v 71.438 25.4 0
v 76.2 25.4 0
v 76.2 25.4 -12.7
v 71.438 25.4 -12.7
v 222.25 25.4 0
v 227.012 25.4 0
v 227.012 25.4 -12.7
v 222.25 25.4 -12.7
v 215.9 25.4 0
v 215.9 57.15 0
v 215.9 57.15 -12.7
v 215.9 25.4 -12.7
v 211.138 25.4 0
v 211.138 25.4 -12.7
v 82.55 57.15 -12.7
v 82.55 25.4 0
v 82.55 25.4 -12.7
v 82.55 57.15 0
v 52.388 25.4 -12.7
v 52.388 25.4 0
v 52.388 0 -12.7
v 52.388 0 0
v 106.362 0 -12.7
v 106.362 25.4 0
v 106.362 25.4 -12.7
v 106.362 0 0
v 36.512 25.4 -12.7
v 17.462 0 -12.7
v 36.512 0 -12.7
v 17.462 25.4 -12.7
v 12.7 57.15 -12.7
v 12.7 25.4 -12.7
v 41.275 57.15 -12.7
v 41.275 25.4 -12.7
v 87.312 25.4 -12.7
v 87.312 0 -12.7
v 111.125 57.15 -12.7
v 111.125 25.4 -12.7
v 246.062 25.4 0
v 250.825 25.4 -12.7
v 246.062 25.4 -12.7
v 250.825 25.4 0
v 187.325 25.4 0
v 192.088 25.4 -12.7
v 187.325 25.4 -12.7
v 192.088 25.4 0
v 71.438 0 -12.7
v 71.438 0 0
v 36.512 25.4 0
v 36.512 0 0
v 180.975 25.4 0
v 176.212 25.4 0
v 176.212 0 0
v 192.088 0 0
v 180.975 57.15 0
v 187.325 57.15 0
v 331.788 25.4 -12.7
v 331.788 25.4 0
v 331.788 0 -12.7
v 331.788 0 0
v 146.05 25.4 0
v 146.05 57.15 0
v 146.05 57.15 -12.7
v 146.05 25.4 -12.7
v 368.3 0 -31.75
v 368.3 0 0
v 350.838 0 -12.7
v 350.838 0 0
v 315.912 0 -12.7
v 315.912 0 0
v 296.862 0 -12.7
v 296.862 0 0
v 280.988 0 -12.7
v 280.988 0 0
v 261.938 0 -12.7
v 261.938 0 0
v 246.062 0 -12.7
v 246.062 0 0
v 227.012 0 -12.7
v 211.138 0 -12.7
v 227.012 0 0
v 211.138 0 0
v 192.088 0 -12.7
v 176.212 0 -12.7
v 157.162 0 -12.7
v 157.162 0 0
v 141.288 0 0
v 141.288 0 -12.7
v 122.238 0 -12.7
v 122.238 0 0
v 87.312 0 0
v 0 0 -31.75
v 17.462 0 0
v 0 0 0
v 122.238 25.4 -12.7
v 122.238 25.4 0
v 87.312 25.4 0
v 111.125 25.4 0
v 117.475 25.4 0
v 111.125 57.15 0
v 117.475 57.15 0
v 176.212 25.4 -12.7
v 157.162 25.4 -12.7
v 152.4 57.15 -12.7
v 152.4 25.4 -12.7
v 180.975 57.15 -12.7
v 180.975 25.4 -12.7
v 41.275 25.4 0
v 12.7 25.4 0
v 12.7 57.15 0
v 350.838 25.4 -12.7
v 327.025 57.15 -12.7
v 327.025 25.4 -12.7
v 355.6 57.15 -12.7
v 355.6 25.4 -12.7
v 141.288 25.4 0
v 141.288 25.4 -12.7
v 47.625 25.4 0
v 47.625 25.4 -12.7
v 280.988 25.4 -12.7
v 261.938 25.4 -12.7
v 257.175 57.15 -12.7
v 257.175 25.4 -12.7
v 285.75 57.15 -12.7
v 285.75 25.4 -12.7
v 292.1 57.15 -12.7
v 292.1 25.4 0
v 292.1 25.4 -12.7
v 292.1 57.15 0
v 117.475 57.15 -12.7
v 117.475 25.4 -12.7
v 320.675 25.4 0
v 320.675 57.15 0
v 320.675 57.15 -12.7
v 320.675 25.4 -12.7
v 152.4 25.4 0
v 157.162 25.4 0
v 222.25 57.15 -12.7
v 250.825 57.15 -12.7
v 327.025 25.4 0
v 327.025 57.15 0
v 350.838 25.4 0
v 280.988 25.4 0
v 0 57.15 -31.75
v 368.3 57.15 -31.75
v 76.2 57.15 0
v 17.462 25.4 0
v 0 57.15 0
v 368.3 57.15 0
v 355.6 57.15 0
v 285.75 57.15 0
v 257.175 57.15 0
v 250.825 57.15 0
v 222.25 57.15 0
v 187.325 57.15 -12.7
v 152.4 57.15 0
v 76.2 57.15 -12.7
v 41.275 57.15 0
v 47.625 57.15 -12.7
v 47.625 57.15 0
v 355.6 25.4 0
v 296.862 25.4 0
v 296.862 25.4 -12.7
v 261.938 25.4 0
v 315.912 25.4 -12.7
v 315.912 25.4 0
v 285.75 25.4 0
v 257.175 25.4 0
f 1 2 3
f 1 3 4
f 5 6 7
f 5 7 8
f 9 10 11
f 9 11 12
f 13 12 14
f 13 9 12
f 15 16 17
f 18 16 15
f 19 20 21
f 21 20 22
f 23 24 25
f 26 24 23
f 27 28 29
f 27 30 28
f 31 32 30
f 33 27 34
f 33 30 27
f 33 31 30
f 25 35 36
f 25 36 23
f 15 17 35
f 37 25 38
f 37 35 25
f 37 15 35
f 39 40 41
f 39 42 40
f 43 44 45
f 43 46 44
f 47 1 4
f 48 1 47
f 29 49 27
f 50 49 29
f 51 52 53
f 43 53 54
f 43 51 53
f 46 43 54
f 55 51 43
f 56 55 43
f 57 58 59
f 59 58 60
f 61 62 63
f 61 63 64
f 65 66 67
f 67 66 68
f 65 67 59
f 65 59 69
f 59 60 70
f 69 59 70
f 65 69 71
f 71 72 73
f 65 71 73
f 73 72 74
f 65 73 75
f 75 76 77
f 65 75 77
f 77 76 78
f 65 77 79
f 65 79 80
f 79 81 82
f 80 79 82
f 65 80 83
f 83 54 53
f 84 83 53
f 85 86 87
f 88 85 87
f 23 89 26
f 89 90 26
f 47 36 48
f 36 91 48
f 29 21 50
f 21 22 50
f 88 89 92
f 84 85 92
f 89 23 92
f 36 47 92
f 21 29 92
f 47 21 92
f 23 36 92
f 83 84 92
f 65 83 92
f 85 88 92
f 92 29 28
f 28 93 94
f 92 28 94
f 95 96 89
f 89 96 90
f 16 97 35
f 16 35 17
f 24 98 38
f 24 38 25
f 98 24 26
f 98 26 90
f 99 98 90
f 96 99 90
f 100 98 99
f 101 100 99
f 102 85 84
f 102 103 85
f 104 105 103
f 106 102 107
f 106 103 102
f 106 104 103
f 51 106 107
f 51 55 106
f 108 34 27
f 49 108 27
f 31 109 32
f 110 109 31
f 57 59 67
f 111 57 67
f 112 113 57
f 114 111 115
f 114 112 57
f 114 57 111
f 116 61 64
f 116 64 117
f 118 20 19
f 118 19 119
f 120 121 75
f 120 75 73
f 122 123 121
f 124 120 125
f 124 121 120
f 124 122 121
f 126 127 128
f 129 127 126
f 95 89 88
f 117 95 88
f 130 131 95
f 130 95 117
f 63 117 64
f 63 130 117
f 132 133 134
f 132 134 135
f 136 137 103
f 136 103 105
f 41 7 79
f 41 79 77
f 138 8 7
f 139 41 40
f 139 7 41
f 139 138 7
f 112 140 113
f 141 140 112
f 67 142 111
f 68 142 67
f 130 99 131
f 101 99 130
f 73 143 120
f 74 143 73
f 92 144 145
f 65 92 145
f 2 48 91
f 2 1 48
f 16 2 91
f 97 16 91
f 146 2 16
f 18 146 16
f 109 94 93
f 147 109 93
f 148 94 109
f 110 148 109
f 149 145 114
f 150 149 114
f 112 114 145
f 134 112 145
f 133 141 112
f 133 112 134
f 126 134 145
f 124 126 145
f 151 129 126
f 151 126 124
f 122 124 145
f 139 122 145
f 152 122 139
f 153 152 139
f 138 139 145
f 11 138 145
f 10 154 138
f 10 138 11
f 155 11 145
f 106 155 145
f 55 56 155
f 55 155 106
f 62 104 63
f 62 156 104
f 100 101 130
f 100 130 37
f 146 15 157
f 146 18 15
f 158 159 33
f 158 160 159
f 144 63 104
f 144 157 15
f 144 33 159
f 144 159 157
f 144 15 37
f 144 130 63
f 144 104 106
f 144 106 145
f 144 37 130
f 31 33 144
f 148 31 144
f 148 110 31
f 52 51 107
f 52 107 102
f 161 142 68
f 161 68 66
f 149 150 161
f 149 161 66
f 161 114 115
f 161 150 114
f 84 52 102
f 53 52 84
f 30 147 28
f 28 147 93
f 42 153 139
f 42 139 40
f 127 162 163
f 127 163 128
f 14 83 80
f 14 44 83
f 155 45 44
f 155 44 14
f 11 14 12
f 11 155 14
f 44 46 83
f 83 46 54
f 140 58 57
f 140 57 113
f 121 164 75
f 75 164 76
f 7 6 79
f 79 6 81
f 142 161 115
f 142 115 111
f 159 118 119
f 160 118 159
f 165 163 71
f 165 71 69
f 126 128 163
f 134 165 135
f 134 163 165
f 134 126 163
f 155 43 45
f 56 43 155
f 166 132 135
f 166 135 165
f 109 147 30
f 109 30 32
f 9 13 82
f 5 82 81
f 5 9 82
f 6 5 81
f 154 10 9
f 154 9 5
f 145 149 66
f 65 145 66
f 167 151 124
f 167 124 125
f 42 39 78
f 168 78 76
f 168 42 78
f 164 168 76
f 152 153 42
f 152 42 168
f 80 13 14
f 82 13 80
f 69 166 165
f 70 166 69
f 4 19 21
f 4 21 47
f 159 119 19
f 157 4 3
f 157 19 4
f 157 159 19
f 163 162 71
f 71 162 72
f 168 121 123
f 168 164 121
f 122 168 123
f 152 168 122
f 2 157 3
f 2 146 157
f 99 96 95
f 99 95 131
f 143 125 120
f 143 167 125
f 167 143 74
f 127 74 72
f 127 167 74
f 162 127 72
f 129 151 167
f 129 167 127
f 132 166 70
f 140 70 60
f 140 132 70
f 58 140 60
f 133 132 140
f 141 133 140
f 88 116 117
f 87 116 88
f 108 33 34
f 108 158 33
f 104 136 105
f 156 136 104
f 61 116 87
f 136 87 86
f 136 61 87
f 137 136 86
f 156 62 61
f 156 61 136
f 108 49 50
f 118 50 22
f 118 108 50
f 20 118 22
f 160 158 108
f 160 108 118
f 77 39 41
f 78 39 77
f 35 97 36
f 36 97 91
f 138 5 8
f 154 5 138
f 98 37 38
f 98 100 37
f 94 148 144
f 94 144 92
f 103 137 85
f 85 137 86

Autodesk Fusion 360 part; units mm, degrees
sketch "Sketch1" plane through (0, 0, 0) normal (0, 0, 1) x (1, 0, 0)
  line L0 (0, 57.15) -> (0, 0)
  line L1 (12.7, 57.15) -> (41.275, 57.15)
  line L2 (41.275, 57.15) -> (41.275, 25.4)
  line L3 (41.275, 25.4) -> (12.7, 25.4)
  line L4 (12.7, 25.4) -> (12.7, 57.15)
  line L5 (26.9875, 25.4) -> (26.9875, 0) construction
  line L6 (17.4625, 25.4) -> (17.4625, 0)
  line L7 (36.5125, 25.4) -> (36.5125, 0)
  line L8 (17.4625, 0) -> (36.5125, 0)
  line L9 (52.3875, 25.4) -> (52.3875, 0)
  line L10 (47.625, 57.15) -> (76.2, 57.15)
  line L11 (61.9125, 25.4) -> (61.9125, 0) construction
  line L12 (47.625, 25.4) -> (47.625, 57.15)
  line L13 (76.2, 25.4) -> (47.625, 25.4)
  line L14 (76.2, 57.15) -> (76.2, 25.4)
  line L15 (71.4375, 25.4) -> (71.4375, 0)
  line L16 (52.3875, 0) -> (71.4375, 0)
  line L17 (87.3125, 25.4) -> (87.3125, 0)
  line L18 (82.55, 57.15) -> (111.125, 57.15)
  line L19 (96.8375, 25.4) -> (96.8375, 0) construction
  line L20 (82.55, 25.4) -> (82.55, 57.15)
  line L21 (111.125, 25.4) -> (82.55, 25.4)
  line L22 (111.125, 57.15) -> (111.125, 25.4)
  line L23 (106.3625, 25.4) -> (106.3625, 0)
  line L24 (87.3125, 0) -> (106.3625, 0)
  line L25 (122.2375, 25.4) -> (122.2375, 0)
  line L26 (117.475, 57.15) -> (146.05, 57.15)
  line L27 (131.7625, 25.4) -> (131.7625, 0) construction
  line L28 (117.475, 25.4) -> (117.475, 57.15)
  line L29 (146.05, 25.4) -> (117.475, 25.4)
  line L30 (146.05, 57.15) -> (146.05, 25.4)
  line L31 (141.2875, 25.4) -> (141.2875, 0)
  line L32 (122.2375, 0) -> (141.2875, 0)
  line L33 (368.3, 57.15) -> (368.3, 0)
  line L34 (368.3, 0) -> (0, 0)
  line L35 (368.3, 57.15) -> (0, 57.15)
  line L36 (176.2125, 25.4) -> (176.2125, 0)
  line L37 (152.4, 57.15) -> (180.975, 57.15)
  line L38 (166.6875, 25.4) -> (166.6875, 0) construction
  line L39 (157.1625, 25.4) -> (157.1625, 0)
  line L40 (180.975, 25.4) -> (152.4, 25.4)
  line L41 (157.1625, 0) -> (176.2125, 0)
  line L42 (180.975, 57.15) -> (180.975, 25.4)
  line L43 (152.4, 25.4) -> (152.4, 57.15)
  line L44 (211.1375, 25.4) -> (211.1375, 0)
  line L45 (187.325, 57.15) -> (215.9, 57.15)
  line L46 (201.6125, 25.4) -> (201.6125, 0) construction
  line L47 (192.0875, 25.4) -> (192.0875, 0)
  line L48 (215.9, 25.4) -> (187.325, 25.4)
  line L49 (192.0875, 0) -> (211.1375, 0)
  line L50 (215.9, 57.15) -> (215.9, 25.4)
  line L51 (187.325, 25.4) -> (187.325, 57.15)
  line L52 (246.0625, 25.4) -> (246.0625, 0)
  line L53 (227.0125, 0) -> (246.0625, 0)
  line L54 (222.25, 57.15) -> (250.825, 57.15)
  line L55 (222.25, 25.4) -> (222.25, 57.15)
  line L56 (227.0125, 25.4) -> (227.0125, 0)
  line L57 (236.5375, 25.4) -> (236.5375, 0) construction
  line L58 (250.825, 25.4) -> (222.25, 25.4)
  line L59 (250.825, 57.15) -> (250.825, 25.4)
  line L60 (280.9875, 25.4) -> (280.9875, 0)
  line L61 (261.9375, 0) -> (280.9875, 0)
  line L62 (257.175, 57.15) -> (285.75, 57.15)
  line L63 (257.175, 25.4) -> (257.175, 57.15)
  line L64 (261.9375, 25.4) -> (261.9375, 0)
  line L65 (271.4625, 25.4) -> (271.4625, 0) construction
  line L66 (285.75, 25.4) -> (257.175, 25.4)
  line L67 (285.75, 57.15) -> (285.75, 25.4)
  line L68 (315.9125, 25.4) -> (315.9125, 0)
  line L69 (296.8625, 0) -> (315.9125, 0)
  line L70 (292.1, 57.15) -> (320.675, 57.15)
  line L71 (292.1, 25.4) -> (292.1, 57.15)
  line L72 (296.8625, 25.4) -> (296.8625, 0)
  line L73 (306.3875, 25.4) -> (306.3875, 0) construction
  line L74 (320.675, 25.4) -> (292.1, 25.4)
  line L75 (320.675, 57.15) -> (320.675, 25.4)
  line L76 (350.8375, 25.4) -> (350.8375, 0)
  line L77 (331.7875, 0) -> (350.8375, 0)
  line L78 (327.025, 57.15) -> (355.6, 57.15)
  line L79 (327.025, 25.4) -> (327.025, 57.15)
  line L80 (331.7875, 25.4) -> (331.7875, 0)
  line L81 (341.3125, 25.4) -> (341.3125, 0) construction
  line L82 (355.6, 25.4) -> (327.025, 25.4)
  line L83 (355.6, 57.15) -> (355.6, 25.4)
  dimension "d2" = 57.15
  dimension "d4" = 28.575
  dimension "d6" = 9.525
  dimension "d7" = 9.525
  dimension "d39" = 31.75
  dimension "d40" = 28.575
  dimension "d41" = 9.525
  dimension "d42" = 9.525
  dimension "d43" = 31.75
  dimension "d44" = 28.575
  dimension "d45" = 9.525
  dimension "d46" = 9.525
  dimension "d47" = 31.75
  dimension "d48" = 28.575
  dimension "d49" = 9.525
  dimension "d50" = 9.525
  dimension "d51" = 31.75
  dimension "d52" = 6.35
  dimension "d53" = 6.35
  dimension "d54" = 6.35
  dimension "d56" = 28.575
  dimension "d57" = 9.525
  dimension "d58" = 9.525
  dimension "d59" = 31.75
  dimension "d60" = 28.575
  dimension "d61" = 9.525
  dimension "d62" = 9.525
  dimension "d63" = 31.75
  dimension "d64" = 6.35
  dimension "d65" = 6.35
  dimension "d77" = 12.7
  dimension "d78" = 28.575
  dimension "d79" = 9.525
  dimension "d80" = 9.525
  dimension "d81" = 31.75
  dimension "d82" = 28.575
  dimension "d83" = 9.525
  dimension "d84" = 9.525
  dimension "d85" = 31.75
  dimension "d86" = 6.35
  dimension "d87" = 6.35
  dimension "d89" = 28.575
  dimension "d90" = 9.525
  dimension "d91" = 9.525
  dimension "d92" = 31.75
  dimension "d93" = 28.575
  dimension "d94" = 9.525
  dimension "d95" = 9.525
  dimension "d96" = 31.75
  dimension "d97" = 12.7
  dimension "d98" = 6.35
  dimension "d99" = 6.35
extrude "Extrude8" add sketch "Sketch1" against normal blind 31.75
extrude "Extrude9" cut sketch "Sketch1" against normal blind 12.7 contours L1 L2 L3 L4 L35 | L3 L6 L7 L8 L34 | L10 L12 L13 L14 L35 | L9 L13 L15 L16 L34 | L18 L20 L21 L22 L35 | L17 L21 L23 L24 L34 | L26 L28 L29 L30 L35 | L25 L29 L31 L32 L34 | L35 L37 L40 L42 L43 | L34 L36 L39 L40 L41 | L35 L45 L48 L50 L51 | L34 L44 L47 L48 L49 | L35 L54 L55 L58 L59 | L34 L52 L53 L56 L58 | L35 L62 L63 L66 L67 | L34 L60 L61 L64 L66 | L35 L70 L71 L74 L75 | L34 L68 L69 L72 L74 | L35 L78 L79 L82 L83 | L34 L76 L77 L80 L82
